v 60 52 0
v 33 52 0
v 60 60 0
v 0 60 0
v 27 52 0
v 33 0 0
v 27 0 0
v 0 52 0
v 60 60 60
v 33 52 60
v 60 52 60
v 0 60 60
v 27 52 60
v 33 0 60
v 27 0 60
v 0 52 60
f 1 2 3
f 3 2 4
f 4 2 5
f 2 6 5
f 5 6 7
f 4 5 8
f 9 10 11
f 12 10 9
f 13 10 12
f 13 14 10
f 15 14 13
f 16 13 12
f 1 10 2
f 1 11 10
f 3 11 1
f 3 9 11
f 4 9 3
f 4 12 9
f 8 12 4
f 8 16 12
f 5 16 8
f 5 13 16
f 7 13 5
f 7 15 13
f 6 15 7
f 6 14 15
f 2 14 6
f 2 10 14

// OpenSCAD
$fn = 32;

// ----------------------------------------------------------------------
// Structural section: tee 60 x 60 mm
// ----------------------------------------------------------------------

// --- parameters (mm) ---
sec_w = 60;               // tee width, X
sec_h = 60;               // tee height, Y
flange_t = 8;             // top flange thickness
web_t = 6;                // web thickness
plate_t = 60;             // cut length, Z (extrusion height)
fit_tol = 0.05;           // declared fit tolerance (prompt contract)
free_tol = 0.2;           // declared free tolerance (prompt contract)

profile = [[27, 0], [33, 0], [33, 52], [60, 52], [60, 60], [0, 60], [0, 52], [27, 52]];  // primary outline, 8 points, counter clockwise

// --- the one profile operation ---
linear_extrude(height = plate_t) polygon(points = profile);
